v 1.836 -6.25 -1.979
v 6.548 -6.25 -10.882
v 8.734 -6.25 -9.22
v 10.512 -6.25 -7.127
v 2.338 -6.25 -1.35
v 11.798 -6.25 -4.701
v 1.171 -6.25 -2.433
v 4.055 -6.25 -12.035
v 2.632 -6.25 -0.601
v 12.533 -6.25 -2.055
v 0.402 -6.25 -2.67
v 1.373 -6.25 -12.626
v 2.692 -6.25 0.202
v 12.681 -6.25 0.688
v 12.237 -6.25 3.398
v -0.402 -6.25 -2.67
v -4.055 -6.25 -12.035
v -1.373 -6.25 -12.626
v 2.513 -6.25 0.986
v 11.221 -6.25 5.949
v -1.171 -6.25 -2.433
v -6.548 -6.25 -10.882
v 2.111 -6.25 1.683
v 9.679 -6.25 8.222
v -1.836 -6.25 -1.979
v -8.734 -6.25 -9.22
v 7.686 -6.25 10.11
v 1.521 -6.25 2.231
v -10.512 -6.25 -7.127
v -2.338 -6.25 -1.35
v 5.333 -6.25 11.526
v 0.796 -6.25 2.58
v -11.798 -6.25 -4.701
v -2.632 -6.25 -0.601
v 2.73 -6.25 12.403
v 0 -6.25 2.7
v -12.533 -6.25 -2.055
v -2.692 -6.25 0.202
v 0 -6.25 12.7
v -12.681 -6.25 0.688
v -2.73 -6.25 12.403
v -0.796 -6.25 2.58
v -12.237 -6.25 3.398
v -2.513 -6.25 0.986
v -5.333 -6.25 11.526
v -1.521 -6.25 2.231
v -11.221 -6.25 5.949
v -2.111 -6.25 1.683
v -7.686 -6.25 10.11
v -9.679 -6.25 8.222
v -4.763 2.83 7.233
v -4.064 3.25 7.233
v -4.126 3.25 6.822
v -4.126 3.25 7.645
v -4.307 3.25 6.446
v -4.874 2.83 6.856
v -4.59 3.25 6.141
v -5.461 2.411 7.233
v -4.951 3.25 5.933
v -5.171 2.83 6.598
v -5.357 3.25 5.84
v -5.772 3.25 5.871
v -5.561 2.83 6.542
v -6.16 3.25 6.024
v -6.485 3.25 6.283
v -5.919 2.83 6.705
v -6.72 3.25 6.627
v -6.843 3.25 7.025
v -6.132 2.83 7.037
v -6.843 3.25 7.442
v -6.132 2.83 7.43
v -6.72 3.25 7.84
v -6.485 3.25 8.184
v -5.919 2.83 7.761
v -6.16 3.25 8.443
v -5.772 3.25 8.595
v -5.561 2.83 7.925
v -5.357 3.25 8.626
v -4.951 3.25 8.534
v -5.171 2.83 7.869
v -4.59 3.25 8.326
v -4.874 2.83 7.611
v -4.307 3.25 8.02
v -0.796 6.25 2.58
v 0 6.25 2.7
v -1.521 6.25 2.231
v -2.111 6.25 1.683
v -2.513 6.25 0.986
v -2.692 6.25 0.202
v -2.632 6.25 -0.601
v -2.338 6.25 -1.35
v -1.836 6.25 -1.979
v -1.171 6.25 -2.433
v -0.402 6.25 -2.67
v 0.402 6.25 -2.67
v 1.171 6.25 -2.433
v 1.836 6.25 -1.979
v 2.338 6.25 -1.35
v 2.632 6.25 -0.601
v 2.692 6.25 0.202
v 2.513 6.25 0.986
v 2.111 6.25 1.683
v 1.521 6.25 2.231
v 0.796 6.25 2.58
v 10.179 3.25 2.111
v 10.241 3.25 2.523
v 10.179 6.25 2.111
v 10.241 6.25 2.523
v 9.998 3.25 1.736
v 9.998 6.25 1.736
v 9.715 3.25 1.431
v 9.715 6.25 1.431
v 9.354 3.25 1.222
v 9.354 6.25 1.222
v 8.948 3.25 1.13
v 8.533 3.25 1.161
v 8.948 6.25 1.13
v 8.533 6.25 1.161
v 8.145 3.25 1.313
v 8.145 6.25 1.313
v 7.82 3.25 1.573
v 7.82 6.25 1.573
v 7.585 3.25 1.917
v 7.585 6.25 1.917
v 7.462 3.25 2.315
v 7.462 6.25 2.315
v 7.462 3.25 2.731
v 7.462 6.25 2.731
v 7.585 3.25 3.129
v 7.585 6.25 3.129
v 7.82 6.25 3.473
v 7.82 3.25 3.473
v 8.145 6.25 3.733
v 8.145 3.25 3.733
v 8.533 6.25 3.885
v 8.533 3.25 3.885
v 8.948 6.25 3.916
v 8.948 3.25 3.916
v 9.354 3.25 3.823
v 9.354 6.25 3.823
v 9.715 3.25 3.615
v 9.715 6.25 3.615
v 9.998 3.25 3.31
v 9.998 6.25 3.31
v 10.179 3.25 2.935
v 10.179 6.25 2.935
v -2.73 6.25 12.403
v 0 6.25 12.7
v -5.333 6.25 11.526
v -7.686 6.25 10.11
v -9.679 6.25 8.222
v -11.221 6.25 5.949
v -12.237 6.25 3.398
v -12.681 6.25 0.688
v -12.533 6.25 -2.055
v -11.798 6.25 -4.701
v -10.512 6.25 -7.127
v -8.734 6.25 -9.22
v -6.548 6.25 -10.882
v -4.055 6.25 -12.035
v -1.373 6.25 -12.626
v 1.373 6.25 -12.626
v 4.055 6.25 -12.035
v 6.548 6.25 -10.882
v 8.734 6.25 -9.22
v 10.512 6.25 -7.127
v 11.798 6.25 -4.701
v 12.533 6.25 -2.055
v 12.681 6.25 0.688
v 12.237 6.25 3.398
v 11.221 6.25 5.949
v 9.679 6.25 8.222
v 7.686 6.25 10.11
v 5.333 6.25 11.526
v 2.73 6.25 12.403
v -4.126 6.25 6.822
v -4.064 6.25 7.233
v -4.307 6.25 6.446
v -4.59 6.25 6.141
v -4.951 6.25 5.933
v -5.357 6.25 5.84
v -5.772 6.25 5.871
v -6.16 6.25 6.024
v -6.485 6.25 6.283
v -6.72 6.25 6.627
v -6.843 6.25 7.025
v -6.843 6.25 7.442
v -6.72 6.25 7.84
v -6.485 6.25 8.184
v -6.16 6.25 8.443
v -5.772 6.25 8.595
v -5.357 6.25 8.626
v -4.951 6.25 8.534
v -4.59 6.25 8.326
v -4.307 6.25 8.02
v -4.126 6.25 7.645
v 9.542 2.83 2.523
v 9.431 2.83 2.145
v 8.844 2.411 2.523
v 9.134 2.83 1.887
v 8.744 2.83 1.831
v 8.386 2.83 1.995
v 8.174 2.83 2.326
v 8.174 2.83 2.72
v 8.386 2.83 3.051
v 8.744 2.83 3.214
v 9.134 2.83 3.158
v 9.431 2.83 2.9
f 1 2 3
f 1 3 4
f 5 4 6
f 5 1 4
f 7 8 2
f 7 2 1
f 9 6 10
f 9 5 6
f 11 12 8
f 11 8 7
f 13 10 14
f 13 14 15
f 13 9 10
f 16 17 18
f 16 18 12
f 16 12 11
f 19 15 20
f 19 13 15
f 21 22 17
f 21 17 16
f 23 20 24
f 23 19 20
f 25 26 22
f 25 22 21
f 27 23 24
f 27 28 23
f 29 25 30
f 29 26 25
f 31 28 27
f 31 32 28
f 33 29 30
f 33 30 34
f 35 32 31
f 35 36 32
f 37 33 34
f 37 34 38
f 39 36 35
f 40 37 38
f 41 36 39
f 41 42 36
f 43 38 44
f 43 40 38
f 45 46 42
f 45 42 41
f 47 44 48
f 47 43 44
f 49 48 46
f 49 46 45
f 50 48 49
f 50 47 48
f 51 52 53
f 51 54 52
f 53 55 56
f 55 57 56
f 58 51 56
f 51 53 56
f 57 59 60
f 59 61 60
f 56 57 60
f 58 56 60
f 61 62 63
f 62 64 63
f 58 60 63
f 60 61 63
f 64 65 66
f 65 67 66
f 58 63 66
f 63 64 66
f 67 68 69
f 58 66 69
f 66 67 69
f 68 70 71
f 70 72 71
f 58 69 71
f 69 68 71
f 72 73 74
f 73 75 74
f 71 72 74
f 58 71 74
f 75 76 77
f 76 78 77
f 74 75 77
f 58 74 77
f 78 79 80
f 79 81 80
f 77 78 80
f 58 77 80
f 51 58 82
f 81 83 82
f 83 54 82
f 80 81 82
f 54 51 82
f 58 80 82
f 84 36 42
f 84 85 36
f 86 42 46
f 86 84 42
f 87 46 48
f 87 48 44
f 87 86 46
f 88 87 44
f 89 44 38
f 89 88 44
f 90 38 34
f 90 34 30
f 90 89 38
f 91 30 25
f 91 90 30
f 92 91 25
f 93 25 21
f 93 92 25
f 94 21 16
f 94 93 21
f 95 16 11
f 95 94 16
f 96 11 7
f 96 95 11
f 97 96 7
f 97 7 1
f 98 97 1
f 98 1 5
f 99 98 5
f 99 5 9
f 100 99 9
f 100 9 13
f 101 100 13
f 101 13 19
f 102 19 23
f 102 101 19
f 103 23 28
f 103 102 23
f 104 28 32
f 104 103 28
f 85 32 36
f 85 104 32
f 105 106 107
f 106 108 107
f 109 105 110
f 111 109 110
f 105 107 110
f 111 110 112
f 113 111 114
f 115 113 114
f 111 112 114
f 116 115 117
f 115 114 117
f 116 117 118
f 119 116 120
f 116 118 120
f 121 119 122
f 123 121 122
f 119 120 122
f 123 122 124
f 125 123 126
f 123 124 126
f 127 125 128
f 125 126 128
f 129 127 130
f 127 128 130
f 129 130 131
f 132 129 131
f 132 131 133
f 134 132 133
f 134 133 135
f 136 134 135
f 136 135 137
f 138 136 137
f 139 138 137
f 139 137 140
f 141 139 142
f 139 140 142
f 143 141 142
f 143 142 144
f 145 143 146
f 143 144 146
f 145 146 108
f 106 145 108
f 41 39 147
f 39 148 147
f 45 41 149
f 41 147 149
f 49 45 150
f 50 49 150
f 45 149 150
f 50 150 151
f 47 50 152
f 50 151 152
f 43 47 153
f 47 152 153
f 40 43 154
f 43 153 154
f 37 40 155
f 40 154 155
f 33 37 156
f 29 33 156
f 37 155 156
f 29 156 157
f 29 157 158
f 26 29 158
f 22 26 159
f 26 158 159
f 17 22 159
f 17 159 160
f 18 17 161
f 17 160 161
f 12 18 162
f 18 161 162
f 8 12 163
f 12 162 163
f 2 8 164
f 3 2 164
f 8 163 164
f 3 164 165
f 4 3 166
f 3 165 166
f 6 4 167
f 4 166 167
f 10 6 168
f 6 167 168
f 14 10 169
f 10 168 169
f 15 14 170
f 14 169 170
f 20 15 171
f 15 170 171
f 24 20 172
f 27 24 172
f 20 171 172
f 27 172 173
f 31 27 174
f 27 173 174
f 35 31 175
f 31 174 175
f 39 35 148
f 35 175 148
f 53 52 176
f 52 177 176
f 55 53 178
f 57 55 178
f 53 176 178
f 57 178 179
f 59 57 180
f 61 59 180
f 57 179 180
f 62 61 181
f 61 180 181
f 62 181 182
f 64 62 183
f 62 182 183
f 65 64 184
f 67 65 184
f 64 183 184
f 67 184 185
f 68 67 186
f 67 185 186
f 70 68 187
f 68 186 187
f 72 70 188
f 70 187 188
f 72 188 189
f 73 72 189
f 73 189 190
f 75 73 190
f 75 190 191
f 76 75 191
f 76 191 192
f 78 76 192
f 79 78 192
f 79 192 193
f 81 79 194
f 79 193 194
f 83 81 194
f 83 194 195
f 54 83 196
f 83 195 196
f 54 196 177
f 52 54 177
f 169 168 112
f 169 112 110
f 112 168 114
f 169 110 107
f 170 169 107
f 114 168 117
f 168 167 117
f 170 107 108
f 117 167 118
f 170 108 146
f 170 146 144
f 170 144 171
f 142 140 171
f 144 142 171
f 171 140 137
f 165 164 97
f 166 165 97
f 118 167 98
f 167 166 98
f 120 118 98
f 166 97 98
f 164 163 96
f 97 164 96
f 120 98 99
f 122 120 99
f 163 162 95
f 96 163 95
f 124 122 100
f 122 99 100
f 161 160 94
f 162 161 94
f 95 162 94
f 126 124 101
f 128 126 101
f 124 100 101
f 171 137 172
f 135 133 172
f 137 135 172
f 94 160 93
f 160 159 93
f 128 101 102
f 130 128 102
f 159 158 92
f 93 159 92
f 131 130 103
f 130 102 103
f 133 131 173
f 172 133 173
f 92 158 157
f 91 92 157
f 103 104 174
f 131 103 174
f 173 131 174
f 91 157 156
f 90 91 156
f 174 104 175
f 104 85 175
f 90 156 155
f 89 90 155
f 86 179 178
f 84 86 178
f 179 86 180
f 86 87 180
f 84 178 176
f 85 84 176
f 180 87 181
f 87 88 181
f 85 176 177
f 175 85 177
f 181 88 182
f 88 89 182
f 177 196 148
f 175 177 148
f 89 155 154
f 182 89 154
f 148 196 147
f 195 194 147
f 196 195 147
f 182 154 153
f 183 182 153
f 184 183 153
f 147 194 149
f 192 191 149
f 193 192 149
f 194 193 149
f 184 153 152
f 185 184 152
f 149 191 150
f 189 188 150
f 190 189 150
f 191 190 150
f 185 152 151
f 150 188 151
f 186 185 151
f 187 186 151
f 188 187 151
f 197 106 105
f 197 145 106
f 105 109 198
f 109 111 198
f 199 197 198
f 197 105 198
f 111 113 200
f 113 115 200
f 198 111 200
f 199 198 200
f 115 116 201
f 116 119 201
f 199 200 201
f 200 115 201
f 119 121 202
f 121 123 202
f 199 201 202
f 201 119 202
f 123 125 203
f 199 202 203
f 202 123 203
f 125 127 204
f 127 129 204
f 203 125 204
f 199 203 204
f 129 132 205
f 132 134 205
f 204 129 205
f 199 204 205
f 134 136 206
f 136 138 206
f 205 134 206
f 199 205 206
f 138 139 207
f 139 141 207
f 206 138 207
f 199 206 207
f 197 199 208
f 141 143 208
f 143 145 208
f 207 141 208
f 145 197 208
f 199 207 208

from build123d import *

# Parameters (mm, degrees)
CROQUIS1_W = 10
CROQUIS1_H = 12.5


# Read off the part's stored shape, not the designer's step: Taladro de margen para #31
with BuildPart() as part:
    # Croquis1 → Revolución1 (revolve)
    with BuildSketch(Plane.XY, mode=Mode.PRIVATE) as revoluci_n1_sk:
        with Locations((-7.7, 0)):
            Rectangle(CROQUIS1_W, CROQUIS1_H)
    revolve(revoluci_n1_sk.sketch.rotate(Axis((0, 15.597345133, 0), (0, -1, 0)), 270), axis=Axis((0, 15.597345133, 0), (0, -1, 0)))

    # Taladro de margen para #31 outline → Taladro de margen para #31 (revolve, cut)
    with BuildSketch(Plane(origin=(8.843839823, 0, 2.522833733), x_dir=(1, 0, 0), z_dir=(0, 0, 1))):
        Polygon((0, 6.25), (0, 2.410597715), (1.397, 3.25), (1.397, 6.25), align=None)
    revolve(axis=Axis((8.843839823, 0, 2.522833733), (0, 1, 0)), mode=Mode.SUBTRACT)

    # Taladro de margen para _31 2 outline → Taladro de margen para _31 2 (revolve, cut)
    with BuildSketch(Plane(origin=(-5.461397488, 0, 7.233375916), x_dir=(1, 0, 0), z_dir=(0, 0, 1))):
        Polygon((0, 6.25), (0, 2.410597715), (1.397, 3.25), (1.397, 6.25), align=None)
    revolve(axis=Axis((-5.461397488, 0, 7.233375916), (0, 1, 0)), mode=Mode.SUBTRACT)


solid = part.part
